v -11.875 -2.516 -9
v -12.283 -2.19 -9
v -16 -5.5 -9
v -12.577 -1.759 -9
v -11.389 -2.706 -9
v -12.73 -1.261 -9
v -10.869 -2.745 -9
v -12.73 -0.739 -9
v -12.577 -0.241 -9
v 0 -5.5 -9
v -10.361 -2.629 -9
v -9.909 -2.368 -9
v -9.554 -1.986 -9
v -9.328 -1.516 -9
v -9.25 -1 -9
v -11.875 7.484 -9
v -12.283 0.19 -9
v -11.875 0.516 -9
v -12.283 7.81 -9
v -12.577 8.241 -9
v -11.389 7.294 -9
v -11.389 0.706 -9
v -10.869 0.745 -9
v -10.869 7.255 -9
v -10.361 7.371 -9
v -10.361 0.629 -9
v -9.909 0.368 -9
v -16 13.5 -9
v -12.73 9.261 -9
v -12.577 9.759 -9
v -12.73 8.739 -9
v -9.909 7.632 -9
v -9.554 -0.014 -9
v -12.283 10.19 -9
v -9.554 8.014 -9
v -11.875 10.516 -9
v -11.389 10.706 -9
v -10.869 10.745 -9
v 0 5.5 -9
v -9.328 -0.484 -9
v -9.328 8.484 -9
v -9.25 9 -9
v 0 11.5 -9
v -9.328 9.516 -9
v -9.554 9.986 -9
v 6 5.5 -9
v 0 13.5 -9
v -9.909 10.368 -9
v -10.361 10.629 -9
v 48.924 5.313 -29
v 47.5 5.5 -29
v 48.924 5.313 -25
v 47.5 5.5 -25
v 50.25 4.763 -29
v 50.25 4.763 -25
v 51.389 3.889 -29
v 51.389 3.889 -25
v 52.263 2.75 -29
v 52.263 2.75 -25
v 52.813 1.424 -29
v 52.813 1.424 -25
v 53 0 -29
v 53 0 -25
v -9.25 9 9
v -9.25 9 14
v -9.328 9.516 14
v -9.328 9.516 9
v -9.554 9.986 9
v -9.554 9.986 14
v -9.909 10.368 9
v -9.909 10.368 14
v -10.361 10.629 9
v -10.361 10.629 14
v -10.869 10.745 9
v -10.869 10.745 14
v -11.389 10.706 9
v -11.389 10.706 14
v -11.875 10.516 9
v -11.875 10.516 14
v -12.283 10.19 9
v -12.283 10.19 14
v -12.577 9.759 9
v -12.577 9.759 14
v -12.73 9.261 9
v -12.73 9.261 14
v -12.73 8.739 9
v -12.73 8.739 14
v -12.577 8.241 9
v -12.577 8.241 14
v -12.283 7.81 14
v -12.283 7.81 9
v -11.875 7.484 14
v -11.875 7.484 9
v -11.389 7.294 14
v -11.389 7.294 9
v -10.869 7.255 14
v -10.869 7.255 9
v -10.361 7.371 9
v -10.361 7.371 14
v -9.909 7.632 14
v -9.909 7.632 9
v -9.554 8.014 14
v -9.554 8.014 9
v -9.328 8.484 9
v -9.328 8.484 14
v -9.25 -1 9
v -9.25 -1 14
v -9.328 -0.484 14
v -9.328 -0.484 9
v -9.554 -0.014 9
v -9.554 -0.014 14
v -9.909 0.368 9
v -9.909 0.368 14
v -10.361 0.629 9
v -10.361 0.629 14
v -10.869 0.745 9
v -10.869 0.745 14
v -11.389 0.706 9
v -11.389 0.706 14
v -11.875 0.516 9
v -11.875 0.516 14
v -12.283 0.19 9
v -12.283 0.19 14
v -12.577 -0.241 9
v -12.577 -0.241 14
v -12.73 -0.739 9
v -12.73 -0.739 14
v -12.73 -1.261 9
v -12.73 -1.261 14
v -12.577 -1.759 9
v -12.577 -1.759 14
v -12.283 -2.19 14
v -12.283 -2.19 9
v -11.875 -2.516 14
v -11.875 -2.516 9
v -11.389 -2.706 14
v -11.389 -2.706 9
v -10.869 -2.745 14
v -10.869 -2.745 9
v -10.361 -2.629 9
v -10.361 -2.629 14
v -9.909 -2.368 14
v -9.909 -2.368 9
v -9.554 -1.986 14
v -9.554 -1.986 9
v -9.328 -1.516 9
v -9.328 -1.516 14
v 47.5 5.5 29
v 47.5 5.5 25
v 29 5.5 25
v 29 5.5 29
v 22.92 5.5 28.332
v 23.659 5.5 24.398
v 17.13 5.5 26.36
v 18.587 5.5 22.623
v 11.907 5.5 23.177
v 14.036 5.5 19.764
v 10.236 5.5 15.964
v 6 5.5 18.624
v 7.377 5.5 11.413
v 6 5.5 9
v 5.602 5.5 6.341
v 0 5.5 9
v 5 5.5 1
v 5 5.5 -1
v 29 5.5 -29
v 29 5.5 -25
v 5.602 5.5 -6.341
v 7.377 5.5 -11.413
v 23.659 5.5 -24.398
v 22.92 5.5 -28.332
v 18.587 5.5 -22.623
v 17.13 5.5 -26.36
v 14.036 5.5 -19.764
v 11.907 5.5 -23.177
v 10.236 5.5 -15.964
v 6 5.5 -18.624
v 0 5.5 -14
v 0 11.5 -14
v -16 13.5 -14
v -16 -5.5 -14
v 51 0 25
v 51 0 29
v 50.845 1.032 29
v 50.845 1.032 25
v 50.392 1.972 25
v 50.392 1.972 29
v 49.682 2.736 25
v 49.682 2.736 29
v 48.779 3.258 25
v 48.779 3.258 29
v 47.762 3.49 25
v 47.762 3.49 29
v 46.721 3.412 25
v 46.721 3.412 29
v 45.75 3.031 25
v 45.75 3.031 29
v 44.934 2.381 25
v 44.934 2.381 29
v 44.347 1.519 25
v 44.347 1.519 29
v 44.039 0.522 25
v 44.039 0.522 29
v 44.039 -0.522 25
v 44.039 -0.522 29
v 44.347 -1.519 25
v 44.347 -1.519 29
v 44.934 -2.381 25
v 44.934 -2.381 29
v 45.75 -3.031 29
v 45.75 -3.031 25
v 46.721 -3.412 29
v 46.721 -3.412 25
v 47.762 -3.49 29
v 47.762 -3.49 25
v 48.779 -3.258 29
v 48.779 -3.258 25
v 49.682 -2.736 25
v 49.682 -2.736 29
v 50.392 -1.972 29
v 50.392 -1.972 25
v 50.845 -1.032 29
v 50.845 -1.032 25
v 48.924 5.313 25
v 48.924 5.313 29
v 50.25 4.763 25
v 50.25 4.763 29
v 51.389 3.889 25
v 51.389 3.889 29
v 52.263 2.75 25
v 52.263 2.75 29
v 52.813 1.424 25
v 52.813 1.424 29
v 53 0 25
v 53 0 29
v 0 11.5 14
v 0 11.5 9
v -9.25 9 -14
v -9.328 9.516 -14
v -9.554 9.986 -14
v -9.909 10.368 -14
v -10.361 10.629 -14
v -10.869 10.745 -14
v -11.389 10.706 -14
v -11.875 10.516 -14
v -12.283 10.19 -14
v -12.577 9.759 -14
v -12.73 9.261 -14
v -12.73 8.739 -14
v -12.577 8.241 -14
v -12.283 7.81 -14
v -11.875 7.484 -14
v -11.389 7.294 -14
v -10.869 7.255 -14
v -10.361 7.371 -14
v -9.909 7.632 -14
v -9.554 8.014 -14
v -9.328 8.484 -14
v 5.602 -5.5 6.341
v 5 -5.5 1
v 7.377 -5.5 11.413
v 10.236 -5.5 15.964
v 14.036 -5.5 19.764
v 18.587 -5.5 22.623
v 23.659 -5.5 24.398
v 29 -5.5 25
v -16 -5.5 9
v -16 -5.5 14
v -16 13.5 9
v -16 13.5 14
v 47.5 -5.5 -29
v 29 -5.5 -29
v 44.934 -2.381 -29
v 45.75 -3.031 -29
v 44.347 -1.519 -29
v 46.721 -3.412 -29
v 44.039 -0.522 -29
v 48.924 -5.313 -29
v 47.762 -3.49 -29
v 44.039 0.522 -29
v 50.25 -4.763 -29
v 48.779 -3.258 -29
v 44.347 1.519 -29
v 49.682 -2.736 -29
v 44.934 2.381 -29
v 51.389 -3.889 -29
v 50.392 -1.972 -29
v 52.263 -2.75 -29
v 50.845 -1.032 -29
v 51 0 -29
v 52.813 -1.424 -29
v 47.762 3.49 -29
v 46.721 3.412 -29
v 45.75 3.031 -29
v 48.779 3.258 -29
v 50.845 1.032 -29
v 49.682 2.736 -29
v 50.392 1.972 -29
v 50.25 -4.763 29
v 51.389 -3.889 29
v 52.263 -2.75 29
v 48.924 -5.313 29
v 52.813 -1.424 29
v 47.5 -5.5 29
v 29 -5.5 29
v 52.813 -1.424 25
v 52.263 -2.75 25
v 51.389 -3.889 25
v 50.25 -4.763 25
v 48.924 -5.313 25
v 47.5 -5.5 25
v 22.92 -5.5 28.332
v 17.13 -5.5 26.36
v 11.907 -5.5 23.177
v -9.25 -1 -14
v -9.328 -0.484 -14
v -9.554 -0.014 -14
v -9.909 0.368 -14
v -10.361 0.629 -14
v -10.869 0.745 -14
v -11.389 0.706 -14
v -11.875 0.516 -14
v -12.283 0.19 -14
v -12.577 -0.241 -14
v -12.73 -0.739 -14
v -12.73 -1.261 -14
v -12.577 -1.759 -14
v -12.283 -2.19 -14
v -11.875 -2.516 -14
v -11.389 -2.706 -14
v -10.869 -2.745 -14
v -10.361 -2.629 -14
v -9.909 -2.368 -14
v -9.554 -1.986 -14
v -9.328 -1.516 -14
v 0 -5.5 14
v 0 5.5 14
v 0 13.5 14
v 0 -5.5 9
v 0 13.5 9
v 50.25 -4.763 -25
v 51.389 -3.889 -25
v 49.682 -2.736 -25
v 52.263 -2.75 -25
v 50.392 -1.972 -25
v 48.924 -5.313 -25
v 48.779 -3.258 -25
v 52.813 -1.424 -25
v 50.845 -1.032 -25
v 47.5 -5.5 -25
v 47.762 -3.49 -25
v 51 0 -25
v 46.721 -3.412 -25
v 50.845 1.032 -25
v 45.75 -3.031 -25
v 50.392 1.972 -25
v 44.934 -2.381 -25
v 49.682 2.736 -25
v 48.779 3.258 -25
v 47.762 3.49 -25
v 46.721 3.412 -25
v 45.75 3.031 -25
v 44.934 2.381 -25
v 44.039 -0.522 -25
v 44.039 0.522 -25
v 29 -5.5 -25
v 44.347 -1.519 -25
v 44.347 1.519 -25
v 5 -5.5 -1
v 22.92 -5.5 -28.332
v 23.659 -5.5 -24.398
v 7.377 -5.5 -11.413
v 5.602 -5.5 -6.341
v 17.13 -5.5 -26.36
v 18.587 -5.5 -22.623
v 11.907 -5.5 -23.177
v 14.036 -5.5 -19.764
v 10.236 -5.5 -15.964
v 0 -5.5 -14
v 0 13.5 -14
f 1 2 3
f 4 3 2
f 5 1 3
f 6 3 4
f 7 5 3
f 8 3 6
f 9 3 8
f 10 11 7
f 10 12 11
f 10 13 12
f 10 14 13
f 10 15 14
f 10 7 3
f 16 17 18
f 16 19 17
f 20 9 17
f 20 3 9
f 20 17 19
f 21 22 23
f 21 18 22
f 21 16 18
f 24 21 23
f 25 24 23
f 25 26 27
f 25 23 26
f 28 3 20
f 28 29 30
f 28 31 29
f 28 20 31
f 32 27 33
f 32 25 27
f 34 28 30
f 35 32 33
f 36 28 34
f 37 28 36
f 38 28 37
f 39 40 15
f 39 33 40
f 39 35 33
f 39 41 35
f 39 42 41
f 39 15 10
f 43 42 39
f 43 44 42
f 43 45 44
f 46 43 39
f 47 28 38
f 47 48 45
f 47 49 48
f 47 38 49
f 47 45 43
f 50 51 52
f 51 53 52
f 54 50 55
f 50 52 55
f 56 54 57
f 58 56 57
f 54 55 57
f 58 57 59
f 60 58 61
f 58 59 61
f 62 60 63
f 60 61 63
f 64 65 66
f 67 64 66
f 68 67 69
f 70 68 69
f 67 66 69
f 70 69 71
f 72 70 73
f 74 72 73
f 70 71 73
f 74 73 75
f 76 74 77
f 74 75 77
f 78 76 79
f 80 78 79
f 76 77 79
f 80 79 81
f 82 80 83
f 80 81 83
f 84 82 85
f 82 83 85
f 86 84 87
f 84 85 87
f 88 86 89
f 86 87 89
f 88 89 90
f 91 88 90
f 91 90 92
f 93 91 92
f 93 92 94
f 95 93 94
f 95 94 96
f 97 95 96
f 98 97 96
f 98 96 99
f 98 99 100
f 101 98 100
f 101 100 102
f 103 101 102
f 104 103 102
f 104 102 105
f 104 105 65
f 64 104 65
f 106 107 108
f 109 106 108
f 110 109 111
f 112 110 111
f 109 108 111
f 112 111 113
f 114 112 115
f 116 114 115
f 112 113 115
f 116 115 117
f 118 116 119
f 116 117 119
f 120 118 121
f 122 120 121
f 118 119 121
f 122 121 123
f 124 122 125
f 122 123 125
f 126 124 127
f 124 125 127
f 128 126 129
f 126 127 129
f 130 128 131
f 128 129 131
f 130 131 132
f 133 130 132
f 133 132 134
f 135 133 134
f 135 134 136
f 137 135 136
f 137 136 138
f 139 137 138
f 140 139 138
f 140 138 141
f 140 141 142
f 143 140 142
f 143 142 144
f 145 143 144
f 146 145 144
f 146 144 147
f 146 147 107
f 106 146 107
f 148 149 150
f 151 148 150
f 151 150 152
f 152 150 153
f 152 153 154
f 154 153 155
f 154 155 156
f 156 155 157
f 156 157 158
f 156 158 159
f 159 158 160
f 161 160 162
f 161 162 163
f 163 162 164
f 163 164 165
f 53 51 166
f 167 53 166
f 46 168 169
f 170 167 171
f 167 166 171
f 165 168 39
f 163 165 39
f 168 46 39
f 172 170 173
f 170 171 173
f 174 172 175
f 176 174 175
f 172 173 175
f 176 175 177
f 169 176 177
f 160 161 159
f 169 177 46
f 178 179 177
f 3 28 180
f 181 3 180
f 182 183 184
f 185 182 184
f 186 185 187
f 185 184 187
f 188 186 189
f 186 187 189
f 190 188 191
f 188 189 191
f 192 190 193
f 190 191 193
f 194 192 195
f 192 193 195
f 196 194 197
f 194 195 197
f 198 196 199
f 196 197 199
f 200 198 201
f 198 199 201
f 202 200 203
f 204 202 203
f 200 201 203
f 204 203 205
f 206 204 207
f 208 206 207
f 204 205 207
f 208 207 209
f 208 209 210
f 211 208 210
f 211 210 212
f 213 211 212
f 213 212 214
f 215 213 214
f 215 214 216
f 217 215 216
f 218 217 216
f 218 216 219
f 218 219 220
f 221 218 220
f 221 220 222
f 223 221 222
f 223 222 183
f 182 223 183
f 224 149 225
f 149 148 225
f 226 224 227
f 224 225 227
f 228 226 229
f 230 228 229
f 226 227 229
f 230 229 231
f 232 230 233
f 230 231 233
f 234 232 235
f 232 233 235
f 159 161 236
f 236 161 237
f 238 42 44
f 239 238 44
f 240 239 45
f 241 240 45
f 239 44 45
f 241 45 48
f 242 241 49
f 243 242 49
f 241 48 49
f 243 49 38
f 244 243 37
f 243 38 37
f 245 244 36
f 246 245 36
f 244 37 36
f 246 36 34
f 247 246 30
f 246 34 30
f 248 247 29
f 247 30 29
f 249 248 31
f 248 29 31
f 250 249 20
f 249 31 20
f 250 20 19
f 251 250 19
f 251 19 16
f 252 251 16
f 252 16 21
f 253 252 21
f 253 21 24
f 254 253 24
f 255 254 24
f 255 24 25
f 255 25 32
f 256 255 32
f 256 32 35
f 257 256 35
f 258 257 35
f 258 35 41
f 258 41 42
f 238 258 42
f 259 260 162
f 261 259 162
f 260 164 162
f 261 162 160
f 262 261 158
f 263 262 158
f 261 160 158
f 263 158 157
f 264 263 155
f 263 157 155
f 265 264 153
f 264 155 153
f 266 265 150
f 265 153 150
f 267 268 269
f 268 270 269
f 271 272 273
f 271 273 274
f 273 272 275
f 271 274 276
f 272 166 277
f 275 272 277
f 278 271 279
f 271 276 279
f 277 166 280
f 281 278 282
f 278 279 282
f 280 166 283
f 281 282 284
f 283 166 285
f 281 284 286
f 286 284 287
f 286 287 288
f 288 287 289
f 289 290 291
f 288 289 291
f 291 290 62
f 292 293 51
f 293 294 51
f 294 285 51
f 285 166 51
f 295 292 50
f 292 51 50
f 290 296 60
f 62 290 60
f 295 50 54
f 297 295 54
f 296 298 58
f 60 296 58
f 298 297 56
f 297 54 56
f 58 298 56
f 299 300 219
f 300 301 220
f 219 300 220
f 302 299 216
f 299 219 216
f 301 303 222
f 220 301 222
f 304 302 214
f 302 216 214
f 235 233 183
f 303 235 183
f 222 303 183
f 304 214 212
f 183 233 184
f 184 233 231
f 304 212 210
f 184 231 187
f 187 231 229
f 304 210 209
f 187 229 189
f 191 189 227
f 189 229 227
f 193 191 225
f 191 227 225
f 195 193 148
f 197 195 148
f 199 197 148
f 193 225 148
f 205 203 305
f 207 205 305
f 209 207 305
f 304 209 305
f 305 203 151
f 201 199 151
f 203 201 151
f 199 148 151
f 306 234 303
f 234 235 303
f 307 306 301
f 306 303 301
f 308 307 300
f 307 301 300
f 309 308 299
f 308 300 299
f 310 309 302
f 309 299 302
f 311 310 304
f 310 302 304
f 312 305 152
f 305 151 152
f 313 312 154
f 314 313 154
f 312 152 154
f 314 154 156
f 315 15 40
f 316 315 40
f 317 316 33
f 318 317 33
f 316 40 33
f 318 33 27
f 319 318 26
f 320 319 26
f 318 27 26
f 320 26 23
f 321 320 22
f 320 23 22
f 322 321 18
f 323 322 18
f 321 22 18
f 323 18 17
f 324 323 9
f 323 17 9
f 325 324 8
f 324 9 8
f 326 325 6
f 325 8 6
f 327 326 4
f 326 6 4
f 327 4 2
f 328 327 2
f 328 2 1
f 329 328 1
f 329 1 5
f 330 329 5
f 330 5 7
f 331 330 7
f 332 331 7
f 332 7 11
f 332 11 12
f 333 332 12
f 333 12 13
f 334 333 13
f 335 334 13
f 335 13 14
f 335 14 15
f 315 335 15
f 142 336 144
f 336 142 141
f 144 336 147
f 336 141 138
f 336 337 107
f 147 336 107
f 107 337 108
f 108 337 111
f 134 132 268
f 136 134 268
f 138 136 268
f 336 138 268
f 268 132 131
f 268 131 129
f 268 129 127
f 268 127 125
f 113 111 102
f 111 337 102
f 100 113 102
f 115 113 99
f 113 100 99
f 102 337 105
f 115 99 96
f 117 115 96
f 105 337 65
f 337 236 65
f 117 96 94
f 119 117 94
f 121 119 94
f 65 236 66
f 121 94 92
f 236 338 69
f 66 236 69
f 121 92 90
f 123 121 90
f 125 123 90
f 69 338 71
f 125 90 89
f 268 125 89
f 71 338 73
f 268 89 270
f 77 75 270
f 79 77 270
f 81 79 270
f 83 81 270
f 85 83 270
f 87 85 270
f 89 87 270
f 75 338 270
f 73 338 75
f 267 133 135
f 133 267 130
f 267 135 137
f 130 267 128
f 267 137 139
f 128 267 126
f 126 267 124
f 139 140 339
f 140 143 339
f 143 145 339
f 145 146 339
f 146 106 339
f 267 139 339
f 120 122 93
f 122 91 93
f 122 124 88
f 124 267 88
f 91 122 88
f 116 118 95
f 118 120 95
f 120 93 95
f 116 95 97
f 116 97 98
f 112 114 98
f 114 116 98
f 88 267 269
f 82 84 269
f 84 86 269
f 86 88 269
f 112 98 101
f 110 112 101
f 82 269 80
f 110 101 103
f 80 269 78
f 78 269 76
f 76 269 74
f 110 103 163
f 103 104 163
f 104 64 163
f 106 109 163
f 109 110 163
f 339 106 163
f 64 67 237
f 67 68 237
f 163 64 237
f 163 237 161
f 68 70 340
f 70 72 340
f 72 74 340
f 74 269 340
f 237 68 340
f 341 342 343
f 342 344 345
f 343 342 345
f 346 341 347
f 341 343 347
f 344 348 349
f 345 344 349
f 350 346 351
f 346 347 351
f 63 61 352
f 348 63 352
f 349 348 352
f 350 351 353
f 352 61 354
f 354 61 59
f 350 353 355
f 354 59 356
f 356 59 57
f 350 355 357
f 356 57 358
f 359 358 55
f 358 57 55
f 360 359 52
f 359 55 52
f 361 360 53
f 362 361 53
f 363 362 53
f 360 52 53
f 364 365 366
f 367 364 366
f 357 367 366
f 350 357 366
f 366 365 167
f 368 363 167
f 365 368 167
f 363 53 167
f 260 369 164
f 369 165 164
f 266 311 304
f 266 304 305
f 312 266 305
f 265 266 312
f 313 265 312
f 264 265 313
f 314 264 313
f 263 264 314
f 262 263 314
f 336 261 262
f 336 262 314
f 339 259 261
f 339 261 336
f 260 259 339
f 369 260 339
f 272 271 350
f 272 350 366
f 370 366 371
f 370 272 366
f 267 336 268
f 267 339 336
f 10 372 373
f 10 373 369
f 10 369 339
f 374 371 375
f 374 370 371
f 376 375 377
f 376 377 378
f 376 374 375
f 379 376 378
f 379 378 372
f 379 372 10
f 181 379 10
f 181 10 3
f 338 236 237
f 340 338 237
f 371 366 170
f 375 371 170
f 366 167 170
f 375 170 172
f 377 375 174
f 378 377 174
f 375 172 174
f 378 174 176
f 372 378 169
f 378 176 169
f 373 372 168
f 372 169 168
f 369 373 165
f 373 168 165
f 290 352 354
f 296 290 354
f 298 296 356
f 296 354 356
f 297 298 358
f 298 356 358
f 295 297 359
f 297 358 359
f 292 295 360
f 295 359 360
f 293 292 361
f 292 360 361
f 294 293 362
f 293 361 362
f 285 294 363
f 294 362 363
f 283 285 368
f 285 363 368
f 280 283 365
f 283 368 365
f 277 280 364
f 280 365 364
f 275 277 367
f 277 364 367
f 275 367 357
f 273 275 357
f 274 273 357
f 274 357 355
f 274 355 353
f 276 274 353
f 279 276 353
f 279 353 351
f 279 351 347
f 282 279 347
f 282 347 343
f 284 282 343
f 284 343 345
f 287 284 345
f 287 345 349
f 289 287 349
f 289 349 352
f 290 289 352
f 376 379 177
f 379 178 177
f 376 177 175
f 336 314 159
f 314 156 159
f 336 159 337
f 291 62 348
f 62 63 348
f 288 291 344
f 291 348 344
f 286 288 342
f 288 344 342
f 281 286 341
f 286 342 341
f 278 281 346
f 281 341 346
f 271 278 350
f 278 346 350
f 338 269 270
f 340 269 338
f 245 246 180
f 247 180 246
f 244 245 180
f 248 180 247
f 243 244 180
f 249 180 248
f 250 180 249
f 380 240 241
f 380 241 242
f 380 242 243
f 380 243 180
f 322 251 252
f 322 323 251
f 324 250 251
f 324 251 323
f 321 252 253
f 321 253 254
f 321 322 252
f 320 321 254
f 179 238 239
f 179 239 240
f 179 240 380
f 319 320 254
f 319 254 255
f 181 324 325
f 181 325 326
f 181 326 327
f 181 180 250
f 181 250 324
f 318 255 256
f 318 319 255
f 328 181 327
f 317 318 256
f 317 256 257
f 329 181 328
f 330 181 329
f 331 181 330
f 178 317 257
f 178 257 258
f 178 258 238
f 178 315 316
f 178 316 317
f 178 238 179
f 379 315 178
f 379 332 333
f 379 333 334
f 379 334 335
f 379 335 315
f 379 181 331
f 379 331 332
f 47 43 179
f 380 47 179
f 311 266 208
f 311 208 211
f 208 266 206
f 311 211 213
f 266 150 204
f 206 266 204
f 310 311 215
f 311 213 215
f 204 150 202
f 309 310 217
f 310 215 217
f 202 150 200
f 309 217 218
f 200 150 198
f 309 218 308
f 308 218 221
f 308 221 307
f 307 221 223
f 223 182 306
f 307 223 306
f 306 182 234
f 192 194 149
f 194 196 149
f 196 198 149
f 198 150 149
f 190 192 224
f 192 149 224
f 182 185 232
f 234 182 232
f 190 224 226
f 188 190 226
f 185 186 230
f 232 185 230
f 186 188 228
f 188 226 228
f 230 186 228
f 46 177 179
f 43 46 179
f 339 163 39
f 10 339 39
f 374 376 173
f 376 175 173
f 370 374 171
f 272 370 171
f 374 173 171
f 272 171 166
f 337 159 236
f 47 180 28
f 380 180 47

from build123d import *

# Parameters (mm, degrees)
BOSS_EXTRUDE1_DEPTH = 5.5
FILLET1_R           = 5.5
SKETCH2_R           = 3.5
CUT_EXTRUDE1_DEPTH  = 79.760713557
SKETCH3_W           = 16
SKETCH3_H           = 5
BOSS_EXTRUDE2_DEPTH = 8
SKETCH4_R           = 1.75
CUT_EXTRUDE2_DEPTH  = 70.571905249
CHAMFER1_SIZE       = 6


# Some blends are built 0.0001 mm under size
with BuildPart() as part:
    # Sketch1 → Boss-Extrude1 (new, symmetric)
    with BuildSketch(Plane(origin=(0, 0, 0), x_dir=(1, 0, 0), z_dir=(0, 1, 0))):
        with BuildLine():
            Line((-16, 9), (-16, 14))
            Line((-16, 14), (0, 14))
            Line((0, 14), (11.907049388, 23.177264019))
            ThreePointArc((11.907049388, 23.177264019), (19.971251264, 27.504371267), (29, 29))
            Line((29, 29), (53, 29))
            Line((53, 29), (53, 25))
            Line((53, 25), (29, 25))
            ThreePointArc((29, 25), (12.029437252, 17.970562748), (5, 1))
            Line((5, 1), (5, -1))
            ThreePointArc((5, -1), (12.029437252, -17.970562748), (29, -25))
            Line((29, -25), (53, -25))
            Line((53, -25), (53, -29))
            Line((53, -29), (29, -29))
            ThreePointArc((29, -29), (19.971251264, -27.504371267), (11.907049388, -23.177264019))
            Line((11.907049388, -23.177264019), (0, -14))
            Line((0, -14), (-16, -14))
            Line((-16, -14), (-16, -9))
            Line((-16, -9), (0, -9))
            Line((0, -9), (0, 9))
            Line((0, 9), (-16, 9))
        make_face()
    extrude(amount=BOSS_EXTRUDE1_DEPTH, both=True)

    # Fillet1
    fillet1_edges = [part.edges().sort_by_distance(p)[0] for p in [
        (53, -5.5, 27),
        (53, 5.5, 27),
        (53, -5.5, -27),
        (53, 5.5, -27),
    ]]
    fillet(fillet1_edges, radius=FILLET1_R - 0.0001)  # a hair under: the kernel refuses the full size

    # Sketch2 → Cut-Extrude1 (cut, through all)
    with BuildSketch(Plane.XY.offset(29)):
        with Locations((47.5, 0)):
            Circle(SKETCH2_R)
    extrude(amount=-CUT_EXTRUDE1_DEPTH, mode=Mode.SUBTRACT)

    # Sketch3 → Boss-Extrude2 (add)
    with BuildSketch(Plane(origin=(0, 5.5, 0), x_dir=(1, 0, 0), z_dir=(0, 1, 0))):
        with Locations((-8, 11.5)):
            Rectangle(SKETCH3_W, SKETCH3_H)
        with Locations((-8, -11.5)):
            Rectangle(SKETCH3_W, SKETCH3_H)
    extrude(amount=BOSS_EXTRUDE2_DEPTH)

    # Sketch4 → Cut-Extrude2 (cut, through all)
    with BuildSketch(Plane.XY.offset(14)):
        with Locations((-11, 9)):
            Circle(SKETCH4_R)
        with Locations((-11, -1)):
            Circle(SKETCH4_R)
    extrude(amount=-CUT_EXTRUDE2_DEPTH, mode=Mode.SUBTRACT)

    # Chamfer1
    # the kernel refuses this chamfer: 6 mm, written as the material it adds along each edge
    with BuildSketch(Plane(origin=(0, 5.5, -29.430097928), x_dir=(0.9996219169112968, -0.027495876610586348, 0), z_dir=(0, 0, 1))) as chamfer1_piece_1_section:
        Polygon((CHAMFER1_SIZE * 0.999621916911, CHAMFER1_SIZE * 0.0274958766106), (-CHAMFER1_SIZE * 0.0274958766106, CHAMFER1_SIZE * 0.999621916911), (0, 0), align=None)
    chamfer1_piece_1 = extrude(amount=20.430097928, mode=Mode.PRIVATE)
    chamfer1_piece_1 = split(chamfer1_piece_1, bisect_by=Plane(origin=(4.348037064, 5.828125, -17.351215133), z_dir=(0.6104625218625276, 0, 0.7920451435374395)), keep=Keep.TOP, mode=Mode.PRIVATE)
    add(chamfer1_piece_1)
    with BuildSketch(Plane(origin=(0, 5.5, 9), x_dir=(0.9996219169112968, -0.027495876610586348, 0), z_dir=(0, 0, 1))) as chamfer1_piece_2_section:
        Polygon((CHAMFER1_SIZE * 0.999621916911, CHAMFER1_SIZE * 0.0274958766106), (-CHAMFER1_SIZE * 0.0274958766106, CHAMFER1_SIZE * 0.999621916911), (0, 0), align=None)
    chamfer1_piece_2 = extrude(amount=20.430097928, mode=Mode.PRIVATE)
    chamfer1_piece_2 = split(chamfer1_piece_2, bisect_by=Plane(origin=(-0.01385991, 7.547619048, 13.989317584), z_dir=(0.6104625218625275, 0, -0.7920451435374395)), keep=Keep.TOP, mode=Mode.PRIVATE)
    add(chamfer1_piece_2)


solid = part.part
